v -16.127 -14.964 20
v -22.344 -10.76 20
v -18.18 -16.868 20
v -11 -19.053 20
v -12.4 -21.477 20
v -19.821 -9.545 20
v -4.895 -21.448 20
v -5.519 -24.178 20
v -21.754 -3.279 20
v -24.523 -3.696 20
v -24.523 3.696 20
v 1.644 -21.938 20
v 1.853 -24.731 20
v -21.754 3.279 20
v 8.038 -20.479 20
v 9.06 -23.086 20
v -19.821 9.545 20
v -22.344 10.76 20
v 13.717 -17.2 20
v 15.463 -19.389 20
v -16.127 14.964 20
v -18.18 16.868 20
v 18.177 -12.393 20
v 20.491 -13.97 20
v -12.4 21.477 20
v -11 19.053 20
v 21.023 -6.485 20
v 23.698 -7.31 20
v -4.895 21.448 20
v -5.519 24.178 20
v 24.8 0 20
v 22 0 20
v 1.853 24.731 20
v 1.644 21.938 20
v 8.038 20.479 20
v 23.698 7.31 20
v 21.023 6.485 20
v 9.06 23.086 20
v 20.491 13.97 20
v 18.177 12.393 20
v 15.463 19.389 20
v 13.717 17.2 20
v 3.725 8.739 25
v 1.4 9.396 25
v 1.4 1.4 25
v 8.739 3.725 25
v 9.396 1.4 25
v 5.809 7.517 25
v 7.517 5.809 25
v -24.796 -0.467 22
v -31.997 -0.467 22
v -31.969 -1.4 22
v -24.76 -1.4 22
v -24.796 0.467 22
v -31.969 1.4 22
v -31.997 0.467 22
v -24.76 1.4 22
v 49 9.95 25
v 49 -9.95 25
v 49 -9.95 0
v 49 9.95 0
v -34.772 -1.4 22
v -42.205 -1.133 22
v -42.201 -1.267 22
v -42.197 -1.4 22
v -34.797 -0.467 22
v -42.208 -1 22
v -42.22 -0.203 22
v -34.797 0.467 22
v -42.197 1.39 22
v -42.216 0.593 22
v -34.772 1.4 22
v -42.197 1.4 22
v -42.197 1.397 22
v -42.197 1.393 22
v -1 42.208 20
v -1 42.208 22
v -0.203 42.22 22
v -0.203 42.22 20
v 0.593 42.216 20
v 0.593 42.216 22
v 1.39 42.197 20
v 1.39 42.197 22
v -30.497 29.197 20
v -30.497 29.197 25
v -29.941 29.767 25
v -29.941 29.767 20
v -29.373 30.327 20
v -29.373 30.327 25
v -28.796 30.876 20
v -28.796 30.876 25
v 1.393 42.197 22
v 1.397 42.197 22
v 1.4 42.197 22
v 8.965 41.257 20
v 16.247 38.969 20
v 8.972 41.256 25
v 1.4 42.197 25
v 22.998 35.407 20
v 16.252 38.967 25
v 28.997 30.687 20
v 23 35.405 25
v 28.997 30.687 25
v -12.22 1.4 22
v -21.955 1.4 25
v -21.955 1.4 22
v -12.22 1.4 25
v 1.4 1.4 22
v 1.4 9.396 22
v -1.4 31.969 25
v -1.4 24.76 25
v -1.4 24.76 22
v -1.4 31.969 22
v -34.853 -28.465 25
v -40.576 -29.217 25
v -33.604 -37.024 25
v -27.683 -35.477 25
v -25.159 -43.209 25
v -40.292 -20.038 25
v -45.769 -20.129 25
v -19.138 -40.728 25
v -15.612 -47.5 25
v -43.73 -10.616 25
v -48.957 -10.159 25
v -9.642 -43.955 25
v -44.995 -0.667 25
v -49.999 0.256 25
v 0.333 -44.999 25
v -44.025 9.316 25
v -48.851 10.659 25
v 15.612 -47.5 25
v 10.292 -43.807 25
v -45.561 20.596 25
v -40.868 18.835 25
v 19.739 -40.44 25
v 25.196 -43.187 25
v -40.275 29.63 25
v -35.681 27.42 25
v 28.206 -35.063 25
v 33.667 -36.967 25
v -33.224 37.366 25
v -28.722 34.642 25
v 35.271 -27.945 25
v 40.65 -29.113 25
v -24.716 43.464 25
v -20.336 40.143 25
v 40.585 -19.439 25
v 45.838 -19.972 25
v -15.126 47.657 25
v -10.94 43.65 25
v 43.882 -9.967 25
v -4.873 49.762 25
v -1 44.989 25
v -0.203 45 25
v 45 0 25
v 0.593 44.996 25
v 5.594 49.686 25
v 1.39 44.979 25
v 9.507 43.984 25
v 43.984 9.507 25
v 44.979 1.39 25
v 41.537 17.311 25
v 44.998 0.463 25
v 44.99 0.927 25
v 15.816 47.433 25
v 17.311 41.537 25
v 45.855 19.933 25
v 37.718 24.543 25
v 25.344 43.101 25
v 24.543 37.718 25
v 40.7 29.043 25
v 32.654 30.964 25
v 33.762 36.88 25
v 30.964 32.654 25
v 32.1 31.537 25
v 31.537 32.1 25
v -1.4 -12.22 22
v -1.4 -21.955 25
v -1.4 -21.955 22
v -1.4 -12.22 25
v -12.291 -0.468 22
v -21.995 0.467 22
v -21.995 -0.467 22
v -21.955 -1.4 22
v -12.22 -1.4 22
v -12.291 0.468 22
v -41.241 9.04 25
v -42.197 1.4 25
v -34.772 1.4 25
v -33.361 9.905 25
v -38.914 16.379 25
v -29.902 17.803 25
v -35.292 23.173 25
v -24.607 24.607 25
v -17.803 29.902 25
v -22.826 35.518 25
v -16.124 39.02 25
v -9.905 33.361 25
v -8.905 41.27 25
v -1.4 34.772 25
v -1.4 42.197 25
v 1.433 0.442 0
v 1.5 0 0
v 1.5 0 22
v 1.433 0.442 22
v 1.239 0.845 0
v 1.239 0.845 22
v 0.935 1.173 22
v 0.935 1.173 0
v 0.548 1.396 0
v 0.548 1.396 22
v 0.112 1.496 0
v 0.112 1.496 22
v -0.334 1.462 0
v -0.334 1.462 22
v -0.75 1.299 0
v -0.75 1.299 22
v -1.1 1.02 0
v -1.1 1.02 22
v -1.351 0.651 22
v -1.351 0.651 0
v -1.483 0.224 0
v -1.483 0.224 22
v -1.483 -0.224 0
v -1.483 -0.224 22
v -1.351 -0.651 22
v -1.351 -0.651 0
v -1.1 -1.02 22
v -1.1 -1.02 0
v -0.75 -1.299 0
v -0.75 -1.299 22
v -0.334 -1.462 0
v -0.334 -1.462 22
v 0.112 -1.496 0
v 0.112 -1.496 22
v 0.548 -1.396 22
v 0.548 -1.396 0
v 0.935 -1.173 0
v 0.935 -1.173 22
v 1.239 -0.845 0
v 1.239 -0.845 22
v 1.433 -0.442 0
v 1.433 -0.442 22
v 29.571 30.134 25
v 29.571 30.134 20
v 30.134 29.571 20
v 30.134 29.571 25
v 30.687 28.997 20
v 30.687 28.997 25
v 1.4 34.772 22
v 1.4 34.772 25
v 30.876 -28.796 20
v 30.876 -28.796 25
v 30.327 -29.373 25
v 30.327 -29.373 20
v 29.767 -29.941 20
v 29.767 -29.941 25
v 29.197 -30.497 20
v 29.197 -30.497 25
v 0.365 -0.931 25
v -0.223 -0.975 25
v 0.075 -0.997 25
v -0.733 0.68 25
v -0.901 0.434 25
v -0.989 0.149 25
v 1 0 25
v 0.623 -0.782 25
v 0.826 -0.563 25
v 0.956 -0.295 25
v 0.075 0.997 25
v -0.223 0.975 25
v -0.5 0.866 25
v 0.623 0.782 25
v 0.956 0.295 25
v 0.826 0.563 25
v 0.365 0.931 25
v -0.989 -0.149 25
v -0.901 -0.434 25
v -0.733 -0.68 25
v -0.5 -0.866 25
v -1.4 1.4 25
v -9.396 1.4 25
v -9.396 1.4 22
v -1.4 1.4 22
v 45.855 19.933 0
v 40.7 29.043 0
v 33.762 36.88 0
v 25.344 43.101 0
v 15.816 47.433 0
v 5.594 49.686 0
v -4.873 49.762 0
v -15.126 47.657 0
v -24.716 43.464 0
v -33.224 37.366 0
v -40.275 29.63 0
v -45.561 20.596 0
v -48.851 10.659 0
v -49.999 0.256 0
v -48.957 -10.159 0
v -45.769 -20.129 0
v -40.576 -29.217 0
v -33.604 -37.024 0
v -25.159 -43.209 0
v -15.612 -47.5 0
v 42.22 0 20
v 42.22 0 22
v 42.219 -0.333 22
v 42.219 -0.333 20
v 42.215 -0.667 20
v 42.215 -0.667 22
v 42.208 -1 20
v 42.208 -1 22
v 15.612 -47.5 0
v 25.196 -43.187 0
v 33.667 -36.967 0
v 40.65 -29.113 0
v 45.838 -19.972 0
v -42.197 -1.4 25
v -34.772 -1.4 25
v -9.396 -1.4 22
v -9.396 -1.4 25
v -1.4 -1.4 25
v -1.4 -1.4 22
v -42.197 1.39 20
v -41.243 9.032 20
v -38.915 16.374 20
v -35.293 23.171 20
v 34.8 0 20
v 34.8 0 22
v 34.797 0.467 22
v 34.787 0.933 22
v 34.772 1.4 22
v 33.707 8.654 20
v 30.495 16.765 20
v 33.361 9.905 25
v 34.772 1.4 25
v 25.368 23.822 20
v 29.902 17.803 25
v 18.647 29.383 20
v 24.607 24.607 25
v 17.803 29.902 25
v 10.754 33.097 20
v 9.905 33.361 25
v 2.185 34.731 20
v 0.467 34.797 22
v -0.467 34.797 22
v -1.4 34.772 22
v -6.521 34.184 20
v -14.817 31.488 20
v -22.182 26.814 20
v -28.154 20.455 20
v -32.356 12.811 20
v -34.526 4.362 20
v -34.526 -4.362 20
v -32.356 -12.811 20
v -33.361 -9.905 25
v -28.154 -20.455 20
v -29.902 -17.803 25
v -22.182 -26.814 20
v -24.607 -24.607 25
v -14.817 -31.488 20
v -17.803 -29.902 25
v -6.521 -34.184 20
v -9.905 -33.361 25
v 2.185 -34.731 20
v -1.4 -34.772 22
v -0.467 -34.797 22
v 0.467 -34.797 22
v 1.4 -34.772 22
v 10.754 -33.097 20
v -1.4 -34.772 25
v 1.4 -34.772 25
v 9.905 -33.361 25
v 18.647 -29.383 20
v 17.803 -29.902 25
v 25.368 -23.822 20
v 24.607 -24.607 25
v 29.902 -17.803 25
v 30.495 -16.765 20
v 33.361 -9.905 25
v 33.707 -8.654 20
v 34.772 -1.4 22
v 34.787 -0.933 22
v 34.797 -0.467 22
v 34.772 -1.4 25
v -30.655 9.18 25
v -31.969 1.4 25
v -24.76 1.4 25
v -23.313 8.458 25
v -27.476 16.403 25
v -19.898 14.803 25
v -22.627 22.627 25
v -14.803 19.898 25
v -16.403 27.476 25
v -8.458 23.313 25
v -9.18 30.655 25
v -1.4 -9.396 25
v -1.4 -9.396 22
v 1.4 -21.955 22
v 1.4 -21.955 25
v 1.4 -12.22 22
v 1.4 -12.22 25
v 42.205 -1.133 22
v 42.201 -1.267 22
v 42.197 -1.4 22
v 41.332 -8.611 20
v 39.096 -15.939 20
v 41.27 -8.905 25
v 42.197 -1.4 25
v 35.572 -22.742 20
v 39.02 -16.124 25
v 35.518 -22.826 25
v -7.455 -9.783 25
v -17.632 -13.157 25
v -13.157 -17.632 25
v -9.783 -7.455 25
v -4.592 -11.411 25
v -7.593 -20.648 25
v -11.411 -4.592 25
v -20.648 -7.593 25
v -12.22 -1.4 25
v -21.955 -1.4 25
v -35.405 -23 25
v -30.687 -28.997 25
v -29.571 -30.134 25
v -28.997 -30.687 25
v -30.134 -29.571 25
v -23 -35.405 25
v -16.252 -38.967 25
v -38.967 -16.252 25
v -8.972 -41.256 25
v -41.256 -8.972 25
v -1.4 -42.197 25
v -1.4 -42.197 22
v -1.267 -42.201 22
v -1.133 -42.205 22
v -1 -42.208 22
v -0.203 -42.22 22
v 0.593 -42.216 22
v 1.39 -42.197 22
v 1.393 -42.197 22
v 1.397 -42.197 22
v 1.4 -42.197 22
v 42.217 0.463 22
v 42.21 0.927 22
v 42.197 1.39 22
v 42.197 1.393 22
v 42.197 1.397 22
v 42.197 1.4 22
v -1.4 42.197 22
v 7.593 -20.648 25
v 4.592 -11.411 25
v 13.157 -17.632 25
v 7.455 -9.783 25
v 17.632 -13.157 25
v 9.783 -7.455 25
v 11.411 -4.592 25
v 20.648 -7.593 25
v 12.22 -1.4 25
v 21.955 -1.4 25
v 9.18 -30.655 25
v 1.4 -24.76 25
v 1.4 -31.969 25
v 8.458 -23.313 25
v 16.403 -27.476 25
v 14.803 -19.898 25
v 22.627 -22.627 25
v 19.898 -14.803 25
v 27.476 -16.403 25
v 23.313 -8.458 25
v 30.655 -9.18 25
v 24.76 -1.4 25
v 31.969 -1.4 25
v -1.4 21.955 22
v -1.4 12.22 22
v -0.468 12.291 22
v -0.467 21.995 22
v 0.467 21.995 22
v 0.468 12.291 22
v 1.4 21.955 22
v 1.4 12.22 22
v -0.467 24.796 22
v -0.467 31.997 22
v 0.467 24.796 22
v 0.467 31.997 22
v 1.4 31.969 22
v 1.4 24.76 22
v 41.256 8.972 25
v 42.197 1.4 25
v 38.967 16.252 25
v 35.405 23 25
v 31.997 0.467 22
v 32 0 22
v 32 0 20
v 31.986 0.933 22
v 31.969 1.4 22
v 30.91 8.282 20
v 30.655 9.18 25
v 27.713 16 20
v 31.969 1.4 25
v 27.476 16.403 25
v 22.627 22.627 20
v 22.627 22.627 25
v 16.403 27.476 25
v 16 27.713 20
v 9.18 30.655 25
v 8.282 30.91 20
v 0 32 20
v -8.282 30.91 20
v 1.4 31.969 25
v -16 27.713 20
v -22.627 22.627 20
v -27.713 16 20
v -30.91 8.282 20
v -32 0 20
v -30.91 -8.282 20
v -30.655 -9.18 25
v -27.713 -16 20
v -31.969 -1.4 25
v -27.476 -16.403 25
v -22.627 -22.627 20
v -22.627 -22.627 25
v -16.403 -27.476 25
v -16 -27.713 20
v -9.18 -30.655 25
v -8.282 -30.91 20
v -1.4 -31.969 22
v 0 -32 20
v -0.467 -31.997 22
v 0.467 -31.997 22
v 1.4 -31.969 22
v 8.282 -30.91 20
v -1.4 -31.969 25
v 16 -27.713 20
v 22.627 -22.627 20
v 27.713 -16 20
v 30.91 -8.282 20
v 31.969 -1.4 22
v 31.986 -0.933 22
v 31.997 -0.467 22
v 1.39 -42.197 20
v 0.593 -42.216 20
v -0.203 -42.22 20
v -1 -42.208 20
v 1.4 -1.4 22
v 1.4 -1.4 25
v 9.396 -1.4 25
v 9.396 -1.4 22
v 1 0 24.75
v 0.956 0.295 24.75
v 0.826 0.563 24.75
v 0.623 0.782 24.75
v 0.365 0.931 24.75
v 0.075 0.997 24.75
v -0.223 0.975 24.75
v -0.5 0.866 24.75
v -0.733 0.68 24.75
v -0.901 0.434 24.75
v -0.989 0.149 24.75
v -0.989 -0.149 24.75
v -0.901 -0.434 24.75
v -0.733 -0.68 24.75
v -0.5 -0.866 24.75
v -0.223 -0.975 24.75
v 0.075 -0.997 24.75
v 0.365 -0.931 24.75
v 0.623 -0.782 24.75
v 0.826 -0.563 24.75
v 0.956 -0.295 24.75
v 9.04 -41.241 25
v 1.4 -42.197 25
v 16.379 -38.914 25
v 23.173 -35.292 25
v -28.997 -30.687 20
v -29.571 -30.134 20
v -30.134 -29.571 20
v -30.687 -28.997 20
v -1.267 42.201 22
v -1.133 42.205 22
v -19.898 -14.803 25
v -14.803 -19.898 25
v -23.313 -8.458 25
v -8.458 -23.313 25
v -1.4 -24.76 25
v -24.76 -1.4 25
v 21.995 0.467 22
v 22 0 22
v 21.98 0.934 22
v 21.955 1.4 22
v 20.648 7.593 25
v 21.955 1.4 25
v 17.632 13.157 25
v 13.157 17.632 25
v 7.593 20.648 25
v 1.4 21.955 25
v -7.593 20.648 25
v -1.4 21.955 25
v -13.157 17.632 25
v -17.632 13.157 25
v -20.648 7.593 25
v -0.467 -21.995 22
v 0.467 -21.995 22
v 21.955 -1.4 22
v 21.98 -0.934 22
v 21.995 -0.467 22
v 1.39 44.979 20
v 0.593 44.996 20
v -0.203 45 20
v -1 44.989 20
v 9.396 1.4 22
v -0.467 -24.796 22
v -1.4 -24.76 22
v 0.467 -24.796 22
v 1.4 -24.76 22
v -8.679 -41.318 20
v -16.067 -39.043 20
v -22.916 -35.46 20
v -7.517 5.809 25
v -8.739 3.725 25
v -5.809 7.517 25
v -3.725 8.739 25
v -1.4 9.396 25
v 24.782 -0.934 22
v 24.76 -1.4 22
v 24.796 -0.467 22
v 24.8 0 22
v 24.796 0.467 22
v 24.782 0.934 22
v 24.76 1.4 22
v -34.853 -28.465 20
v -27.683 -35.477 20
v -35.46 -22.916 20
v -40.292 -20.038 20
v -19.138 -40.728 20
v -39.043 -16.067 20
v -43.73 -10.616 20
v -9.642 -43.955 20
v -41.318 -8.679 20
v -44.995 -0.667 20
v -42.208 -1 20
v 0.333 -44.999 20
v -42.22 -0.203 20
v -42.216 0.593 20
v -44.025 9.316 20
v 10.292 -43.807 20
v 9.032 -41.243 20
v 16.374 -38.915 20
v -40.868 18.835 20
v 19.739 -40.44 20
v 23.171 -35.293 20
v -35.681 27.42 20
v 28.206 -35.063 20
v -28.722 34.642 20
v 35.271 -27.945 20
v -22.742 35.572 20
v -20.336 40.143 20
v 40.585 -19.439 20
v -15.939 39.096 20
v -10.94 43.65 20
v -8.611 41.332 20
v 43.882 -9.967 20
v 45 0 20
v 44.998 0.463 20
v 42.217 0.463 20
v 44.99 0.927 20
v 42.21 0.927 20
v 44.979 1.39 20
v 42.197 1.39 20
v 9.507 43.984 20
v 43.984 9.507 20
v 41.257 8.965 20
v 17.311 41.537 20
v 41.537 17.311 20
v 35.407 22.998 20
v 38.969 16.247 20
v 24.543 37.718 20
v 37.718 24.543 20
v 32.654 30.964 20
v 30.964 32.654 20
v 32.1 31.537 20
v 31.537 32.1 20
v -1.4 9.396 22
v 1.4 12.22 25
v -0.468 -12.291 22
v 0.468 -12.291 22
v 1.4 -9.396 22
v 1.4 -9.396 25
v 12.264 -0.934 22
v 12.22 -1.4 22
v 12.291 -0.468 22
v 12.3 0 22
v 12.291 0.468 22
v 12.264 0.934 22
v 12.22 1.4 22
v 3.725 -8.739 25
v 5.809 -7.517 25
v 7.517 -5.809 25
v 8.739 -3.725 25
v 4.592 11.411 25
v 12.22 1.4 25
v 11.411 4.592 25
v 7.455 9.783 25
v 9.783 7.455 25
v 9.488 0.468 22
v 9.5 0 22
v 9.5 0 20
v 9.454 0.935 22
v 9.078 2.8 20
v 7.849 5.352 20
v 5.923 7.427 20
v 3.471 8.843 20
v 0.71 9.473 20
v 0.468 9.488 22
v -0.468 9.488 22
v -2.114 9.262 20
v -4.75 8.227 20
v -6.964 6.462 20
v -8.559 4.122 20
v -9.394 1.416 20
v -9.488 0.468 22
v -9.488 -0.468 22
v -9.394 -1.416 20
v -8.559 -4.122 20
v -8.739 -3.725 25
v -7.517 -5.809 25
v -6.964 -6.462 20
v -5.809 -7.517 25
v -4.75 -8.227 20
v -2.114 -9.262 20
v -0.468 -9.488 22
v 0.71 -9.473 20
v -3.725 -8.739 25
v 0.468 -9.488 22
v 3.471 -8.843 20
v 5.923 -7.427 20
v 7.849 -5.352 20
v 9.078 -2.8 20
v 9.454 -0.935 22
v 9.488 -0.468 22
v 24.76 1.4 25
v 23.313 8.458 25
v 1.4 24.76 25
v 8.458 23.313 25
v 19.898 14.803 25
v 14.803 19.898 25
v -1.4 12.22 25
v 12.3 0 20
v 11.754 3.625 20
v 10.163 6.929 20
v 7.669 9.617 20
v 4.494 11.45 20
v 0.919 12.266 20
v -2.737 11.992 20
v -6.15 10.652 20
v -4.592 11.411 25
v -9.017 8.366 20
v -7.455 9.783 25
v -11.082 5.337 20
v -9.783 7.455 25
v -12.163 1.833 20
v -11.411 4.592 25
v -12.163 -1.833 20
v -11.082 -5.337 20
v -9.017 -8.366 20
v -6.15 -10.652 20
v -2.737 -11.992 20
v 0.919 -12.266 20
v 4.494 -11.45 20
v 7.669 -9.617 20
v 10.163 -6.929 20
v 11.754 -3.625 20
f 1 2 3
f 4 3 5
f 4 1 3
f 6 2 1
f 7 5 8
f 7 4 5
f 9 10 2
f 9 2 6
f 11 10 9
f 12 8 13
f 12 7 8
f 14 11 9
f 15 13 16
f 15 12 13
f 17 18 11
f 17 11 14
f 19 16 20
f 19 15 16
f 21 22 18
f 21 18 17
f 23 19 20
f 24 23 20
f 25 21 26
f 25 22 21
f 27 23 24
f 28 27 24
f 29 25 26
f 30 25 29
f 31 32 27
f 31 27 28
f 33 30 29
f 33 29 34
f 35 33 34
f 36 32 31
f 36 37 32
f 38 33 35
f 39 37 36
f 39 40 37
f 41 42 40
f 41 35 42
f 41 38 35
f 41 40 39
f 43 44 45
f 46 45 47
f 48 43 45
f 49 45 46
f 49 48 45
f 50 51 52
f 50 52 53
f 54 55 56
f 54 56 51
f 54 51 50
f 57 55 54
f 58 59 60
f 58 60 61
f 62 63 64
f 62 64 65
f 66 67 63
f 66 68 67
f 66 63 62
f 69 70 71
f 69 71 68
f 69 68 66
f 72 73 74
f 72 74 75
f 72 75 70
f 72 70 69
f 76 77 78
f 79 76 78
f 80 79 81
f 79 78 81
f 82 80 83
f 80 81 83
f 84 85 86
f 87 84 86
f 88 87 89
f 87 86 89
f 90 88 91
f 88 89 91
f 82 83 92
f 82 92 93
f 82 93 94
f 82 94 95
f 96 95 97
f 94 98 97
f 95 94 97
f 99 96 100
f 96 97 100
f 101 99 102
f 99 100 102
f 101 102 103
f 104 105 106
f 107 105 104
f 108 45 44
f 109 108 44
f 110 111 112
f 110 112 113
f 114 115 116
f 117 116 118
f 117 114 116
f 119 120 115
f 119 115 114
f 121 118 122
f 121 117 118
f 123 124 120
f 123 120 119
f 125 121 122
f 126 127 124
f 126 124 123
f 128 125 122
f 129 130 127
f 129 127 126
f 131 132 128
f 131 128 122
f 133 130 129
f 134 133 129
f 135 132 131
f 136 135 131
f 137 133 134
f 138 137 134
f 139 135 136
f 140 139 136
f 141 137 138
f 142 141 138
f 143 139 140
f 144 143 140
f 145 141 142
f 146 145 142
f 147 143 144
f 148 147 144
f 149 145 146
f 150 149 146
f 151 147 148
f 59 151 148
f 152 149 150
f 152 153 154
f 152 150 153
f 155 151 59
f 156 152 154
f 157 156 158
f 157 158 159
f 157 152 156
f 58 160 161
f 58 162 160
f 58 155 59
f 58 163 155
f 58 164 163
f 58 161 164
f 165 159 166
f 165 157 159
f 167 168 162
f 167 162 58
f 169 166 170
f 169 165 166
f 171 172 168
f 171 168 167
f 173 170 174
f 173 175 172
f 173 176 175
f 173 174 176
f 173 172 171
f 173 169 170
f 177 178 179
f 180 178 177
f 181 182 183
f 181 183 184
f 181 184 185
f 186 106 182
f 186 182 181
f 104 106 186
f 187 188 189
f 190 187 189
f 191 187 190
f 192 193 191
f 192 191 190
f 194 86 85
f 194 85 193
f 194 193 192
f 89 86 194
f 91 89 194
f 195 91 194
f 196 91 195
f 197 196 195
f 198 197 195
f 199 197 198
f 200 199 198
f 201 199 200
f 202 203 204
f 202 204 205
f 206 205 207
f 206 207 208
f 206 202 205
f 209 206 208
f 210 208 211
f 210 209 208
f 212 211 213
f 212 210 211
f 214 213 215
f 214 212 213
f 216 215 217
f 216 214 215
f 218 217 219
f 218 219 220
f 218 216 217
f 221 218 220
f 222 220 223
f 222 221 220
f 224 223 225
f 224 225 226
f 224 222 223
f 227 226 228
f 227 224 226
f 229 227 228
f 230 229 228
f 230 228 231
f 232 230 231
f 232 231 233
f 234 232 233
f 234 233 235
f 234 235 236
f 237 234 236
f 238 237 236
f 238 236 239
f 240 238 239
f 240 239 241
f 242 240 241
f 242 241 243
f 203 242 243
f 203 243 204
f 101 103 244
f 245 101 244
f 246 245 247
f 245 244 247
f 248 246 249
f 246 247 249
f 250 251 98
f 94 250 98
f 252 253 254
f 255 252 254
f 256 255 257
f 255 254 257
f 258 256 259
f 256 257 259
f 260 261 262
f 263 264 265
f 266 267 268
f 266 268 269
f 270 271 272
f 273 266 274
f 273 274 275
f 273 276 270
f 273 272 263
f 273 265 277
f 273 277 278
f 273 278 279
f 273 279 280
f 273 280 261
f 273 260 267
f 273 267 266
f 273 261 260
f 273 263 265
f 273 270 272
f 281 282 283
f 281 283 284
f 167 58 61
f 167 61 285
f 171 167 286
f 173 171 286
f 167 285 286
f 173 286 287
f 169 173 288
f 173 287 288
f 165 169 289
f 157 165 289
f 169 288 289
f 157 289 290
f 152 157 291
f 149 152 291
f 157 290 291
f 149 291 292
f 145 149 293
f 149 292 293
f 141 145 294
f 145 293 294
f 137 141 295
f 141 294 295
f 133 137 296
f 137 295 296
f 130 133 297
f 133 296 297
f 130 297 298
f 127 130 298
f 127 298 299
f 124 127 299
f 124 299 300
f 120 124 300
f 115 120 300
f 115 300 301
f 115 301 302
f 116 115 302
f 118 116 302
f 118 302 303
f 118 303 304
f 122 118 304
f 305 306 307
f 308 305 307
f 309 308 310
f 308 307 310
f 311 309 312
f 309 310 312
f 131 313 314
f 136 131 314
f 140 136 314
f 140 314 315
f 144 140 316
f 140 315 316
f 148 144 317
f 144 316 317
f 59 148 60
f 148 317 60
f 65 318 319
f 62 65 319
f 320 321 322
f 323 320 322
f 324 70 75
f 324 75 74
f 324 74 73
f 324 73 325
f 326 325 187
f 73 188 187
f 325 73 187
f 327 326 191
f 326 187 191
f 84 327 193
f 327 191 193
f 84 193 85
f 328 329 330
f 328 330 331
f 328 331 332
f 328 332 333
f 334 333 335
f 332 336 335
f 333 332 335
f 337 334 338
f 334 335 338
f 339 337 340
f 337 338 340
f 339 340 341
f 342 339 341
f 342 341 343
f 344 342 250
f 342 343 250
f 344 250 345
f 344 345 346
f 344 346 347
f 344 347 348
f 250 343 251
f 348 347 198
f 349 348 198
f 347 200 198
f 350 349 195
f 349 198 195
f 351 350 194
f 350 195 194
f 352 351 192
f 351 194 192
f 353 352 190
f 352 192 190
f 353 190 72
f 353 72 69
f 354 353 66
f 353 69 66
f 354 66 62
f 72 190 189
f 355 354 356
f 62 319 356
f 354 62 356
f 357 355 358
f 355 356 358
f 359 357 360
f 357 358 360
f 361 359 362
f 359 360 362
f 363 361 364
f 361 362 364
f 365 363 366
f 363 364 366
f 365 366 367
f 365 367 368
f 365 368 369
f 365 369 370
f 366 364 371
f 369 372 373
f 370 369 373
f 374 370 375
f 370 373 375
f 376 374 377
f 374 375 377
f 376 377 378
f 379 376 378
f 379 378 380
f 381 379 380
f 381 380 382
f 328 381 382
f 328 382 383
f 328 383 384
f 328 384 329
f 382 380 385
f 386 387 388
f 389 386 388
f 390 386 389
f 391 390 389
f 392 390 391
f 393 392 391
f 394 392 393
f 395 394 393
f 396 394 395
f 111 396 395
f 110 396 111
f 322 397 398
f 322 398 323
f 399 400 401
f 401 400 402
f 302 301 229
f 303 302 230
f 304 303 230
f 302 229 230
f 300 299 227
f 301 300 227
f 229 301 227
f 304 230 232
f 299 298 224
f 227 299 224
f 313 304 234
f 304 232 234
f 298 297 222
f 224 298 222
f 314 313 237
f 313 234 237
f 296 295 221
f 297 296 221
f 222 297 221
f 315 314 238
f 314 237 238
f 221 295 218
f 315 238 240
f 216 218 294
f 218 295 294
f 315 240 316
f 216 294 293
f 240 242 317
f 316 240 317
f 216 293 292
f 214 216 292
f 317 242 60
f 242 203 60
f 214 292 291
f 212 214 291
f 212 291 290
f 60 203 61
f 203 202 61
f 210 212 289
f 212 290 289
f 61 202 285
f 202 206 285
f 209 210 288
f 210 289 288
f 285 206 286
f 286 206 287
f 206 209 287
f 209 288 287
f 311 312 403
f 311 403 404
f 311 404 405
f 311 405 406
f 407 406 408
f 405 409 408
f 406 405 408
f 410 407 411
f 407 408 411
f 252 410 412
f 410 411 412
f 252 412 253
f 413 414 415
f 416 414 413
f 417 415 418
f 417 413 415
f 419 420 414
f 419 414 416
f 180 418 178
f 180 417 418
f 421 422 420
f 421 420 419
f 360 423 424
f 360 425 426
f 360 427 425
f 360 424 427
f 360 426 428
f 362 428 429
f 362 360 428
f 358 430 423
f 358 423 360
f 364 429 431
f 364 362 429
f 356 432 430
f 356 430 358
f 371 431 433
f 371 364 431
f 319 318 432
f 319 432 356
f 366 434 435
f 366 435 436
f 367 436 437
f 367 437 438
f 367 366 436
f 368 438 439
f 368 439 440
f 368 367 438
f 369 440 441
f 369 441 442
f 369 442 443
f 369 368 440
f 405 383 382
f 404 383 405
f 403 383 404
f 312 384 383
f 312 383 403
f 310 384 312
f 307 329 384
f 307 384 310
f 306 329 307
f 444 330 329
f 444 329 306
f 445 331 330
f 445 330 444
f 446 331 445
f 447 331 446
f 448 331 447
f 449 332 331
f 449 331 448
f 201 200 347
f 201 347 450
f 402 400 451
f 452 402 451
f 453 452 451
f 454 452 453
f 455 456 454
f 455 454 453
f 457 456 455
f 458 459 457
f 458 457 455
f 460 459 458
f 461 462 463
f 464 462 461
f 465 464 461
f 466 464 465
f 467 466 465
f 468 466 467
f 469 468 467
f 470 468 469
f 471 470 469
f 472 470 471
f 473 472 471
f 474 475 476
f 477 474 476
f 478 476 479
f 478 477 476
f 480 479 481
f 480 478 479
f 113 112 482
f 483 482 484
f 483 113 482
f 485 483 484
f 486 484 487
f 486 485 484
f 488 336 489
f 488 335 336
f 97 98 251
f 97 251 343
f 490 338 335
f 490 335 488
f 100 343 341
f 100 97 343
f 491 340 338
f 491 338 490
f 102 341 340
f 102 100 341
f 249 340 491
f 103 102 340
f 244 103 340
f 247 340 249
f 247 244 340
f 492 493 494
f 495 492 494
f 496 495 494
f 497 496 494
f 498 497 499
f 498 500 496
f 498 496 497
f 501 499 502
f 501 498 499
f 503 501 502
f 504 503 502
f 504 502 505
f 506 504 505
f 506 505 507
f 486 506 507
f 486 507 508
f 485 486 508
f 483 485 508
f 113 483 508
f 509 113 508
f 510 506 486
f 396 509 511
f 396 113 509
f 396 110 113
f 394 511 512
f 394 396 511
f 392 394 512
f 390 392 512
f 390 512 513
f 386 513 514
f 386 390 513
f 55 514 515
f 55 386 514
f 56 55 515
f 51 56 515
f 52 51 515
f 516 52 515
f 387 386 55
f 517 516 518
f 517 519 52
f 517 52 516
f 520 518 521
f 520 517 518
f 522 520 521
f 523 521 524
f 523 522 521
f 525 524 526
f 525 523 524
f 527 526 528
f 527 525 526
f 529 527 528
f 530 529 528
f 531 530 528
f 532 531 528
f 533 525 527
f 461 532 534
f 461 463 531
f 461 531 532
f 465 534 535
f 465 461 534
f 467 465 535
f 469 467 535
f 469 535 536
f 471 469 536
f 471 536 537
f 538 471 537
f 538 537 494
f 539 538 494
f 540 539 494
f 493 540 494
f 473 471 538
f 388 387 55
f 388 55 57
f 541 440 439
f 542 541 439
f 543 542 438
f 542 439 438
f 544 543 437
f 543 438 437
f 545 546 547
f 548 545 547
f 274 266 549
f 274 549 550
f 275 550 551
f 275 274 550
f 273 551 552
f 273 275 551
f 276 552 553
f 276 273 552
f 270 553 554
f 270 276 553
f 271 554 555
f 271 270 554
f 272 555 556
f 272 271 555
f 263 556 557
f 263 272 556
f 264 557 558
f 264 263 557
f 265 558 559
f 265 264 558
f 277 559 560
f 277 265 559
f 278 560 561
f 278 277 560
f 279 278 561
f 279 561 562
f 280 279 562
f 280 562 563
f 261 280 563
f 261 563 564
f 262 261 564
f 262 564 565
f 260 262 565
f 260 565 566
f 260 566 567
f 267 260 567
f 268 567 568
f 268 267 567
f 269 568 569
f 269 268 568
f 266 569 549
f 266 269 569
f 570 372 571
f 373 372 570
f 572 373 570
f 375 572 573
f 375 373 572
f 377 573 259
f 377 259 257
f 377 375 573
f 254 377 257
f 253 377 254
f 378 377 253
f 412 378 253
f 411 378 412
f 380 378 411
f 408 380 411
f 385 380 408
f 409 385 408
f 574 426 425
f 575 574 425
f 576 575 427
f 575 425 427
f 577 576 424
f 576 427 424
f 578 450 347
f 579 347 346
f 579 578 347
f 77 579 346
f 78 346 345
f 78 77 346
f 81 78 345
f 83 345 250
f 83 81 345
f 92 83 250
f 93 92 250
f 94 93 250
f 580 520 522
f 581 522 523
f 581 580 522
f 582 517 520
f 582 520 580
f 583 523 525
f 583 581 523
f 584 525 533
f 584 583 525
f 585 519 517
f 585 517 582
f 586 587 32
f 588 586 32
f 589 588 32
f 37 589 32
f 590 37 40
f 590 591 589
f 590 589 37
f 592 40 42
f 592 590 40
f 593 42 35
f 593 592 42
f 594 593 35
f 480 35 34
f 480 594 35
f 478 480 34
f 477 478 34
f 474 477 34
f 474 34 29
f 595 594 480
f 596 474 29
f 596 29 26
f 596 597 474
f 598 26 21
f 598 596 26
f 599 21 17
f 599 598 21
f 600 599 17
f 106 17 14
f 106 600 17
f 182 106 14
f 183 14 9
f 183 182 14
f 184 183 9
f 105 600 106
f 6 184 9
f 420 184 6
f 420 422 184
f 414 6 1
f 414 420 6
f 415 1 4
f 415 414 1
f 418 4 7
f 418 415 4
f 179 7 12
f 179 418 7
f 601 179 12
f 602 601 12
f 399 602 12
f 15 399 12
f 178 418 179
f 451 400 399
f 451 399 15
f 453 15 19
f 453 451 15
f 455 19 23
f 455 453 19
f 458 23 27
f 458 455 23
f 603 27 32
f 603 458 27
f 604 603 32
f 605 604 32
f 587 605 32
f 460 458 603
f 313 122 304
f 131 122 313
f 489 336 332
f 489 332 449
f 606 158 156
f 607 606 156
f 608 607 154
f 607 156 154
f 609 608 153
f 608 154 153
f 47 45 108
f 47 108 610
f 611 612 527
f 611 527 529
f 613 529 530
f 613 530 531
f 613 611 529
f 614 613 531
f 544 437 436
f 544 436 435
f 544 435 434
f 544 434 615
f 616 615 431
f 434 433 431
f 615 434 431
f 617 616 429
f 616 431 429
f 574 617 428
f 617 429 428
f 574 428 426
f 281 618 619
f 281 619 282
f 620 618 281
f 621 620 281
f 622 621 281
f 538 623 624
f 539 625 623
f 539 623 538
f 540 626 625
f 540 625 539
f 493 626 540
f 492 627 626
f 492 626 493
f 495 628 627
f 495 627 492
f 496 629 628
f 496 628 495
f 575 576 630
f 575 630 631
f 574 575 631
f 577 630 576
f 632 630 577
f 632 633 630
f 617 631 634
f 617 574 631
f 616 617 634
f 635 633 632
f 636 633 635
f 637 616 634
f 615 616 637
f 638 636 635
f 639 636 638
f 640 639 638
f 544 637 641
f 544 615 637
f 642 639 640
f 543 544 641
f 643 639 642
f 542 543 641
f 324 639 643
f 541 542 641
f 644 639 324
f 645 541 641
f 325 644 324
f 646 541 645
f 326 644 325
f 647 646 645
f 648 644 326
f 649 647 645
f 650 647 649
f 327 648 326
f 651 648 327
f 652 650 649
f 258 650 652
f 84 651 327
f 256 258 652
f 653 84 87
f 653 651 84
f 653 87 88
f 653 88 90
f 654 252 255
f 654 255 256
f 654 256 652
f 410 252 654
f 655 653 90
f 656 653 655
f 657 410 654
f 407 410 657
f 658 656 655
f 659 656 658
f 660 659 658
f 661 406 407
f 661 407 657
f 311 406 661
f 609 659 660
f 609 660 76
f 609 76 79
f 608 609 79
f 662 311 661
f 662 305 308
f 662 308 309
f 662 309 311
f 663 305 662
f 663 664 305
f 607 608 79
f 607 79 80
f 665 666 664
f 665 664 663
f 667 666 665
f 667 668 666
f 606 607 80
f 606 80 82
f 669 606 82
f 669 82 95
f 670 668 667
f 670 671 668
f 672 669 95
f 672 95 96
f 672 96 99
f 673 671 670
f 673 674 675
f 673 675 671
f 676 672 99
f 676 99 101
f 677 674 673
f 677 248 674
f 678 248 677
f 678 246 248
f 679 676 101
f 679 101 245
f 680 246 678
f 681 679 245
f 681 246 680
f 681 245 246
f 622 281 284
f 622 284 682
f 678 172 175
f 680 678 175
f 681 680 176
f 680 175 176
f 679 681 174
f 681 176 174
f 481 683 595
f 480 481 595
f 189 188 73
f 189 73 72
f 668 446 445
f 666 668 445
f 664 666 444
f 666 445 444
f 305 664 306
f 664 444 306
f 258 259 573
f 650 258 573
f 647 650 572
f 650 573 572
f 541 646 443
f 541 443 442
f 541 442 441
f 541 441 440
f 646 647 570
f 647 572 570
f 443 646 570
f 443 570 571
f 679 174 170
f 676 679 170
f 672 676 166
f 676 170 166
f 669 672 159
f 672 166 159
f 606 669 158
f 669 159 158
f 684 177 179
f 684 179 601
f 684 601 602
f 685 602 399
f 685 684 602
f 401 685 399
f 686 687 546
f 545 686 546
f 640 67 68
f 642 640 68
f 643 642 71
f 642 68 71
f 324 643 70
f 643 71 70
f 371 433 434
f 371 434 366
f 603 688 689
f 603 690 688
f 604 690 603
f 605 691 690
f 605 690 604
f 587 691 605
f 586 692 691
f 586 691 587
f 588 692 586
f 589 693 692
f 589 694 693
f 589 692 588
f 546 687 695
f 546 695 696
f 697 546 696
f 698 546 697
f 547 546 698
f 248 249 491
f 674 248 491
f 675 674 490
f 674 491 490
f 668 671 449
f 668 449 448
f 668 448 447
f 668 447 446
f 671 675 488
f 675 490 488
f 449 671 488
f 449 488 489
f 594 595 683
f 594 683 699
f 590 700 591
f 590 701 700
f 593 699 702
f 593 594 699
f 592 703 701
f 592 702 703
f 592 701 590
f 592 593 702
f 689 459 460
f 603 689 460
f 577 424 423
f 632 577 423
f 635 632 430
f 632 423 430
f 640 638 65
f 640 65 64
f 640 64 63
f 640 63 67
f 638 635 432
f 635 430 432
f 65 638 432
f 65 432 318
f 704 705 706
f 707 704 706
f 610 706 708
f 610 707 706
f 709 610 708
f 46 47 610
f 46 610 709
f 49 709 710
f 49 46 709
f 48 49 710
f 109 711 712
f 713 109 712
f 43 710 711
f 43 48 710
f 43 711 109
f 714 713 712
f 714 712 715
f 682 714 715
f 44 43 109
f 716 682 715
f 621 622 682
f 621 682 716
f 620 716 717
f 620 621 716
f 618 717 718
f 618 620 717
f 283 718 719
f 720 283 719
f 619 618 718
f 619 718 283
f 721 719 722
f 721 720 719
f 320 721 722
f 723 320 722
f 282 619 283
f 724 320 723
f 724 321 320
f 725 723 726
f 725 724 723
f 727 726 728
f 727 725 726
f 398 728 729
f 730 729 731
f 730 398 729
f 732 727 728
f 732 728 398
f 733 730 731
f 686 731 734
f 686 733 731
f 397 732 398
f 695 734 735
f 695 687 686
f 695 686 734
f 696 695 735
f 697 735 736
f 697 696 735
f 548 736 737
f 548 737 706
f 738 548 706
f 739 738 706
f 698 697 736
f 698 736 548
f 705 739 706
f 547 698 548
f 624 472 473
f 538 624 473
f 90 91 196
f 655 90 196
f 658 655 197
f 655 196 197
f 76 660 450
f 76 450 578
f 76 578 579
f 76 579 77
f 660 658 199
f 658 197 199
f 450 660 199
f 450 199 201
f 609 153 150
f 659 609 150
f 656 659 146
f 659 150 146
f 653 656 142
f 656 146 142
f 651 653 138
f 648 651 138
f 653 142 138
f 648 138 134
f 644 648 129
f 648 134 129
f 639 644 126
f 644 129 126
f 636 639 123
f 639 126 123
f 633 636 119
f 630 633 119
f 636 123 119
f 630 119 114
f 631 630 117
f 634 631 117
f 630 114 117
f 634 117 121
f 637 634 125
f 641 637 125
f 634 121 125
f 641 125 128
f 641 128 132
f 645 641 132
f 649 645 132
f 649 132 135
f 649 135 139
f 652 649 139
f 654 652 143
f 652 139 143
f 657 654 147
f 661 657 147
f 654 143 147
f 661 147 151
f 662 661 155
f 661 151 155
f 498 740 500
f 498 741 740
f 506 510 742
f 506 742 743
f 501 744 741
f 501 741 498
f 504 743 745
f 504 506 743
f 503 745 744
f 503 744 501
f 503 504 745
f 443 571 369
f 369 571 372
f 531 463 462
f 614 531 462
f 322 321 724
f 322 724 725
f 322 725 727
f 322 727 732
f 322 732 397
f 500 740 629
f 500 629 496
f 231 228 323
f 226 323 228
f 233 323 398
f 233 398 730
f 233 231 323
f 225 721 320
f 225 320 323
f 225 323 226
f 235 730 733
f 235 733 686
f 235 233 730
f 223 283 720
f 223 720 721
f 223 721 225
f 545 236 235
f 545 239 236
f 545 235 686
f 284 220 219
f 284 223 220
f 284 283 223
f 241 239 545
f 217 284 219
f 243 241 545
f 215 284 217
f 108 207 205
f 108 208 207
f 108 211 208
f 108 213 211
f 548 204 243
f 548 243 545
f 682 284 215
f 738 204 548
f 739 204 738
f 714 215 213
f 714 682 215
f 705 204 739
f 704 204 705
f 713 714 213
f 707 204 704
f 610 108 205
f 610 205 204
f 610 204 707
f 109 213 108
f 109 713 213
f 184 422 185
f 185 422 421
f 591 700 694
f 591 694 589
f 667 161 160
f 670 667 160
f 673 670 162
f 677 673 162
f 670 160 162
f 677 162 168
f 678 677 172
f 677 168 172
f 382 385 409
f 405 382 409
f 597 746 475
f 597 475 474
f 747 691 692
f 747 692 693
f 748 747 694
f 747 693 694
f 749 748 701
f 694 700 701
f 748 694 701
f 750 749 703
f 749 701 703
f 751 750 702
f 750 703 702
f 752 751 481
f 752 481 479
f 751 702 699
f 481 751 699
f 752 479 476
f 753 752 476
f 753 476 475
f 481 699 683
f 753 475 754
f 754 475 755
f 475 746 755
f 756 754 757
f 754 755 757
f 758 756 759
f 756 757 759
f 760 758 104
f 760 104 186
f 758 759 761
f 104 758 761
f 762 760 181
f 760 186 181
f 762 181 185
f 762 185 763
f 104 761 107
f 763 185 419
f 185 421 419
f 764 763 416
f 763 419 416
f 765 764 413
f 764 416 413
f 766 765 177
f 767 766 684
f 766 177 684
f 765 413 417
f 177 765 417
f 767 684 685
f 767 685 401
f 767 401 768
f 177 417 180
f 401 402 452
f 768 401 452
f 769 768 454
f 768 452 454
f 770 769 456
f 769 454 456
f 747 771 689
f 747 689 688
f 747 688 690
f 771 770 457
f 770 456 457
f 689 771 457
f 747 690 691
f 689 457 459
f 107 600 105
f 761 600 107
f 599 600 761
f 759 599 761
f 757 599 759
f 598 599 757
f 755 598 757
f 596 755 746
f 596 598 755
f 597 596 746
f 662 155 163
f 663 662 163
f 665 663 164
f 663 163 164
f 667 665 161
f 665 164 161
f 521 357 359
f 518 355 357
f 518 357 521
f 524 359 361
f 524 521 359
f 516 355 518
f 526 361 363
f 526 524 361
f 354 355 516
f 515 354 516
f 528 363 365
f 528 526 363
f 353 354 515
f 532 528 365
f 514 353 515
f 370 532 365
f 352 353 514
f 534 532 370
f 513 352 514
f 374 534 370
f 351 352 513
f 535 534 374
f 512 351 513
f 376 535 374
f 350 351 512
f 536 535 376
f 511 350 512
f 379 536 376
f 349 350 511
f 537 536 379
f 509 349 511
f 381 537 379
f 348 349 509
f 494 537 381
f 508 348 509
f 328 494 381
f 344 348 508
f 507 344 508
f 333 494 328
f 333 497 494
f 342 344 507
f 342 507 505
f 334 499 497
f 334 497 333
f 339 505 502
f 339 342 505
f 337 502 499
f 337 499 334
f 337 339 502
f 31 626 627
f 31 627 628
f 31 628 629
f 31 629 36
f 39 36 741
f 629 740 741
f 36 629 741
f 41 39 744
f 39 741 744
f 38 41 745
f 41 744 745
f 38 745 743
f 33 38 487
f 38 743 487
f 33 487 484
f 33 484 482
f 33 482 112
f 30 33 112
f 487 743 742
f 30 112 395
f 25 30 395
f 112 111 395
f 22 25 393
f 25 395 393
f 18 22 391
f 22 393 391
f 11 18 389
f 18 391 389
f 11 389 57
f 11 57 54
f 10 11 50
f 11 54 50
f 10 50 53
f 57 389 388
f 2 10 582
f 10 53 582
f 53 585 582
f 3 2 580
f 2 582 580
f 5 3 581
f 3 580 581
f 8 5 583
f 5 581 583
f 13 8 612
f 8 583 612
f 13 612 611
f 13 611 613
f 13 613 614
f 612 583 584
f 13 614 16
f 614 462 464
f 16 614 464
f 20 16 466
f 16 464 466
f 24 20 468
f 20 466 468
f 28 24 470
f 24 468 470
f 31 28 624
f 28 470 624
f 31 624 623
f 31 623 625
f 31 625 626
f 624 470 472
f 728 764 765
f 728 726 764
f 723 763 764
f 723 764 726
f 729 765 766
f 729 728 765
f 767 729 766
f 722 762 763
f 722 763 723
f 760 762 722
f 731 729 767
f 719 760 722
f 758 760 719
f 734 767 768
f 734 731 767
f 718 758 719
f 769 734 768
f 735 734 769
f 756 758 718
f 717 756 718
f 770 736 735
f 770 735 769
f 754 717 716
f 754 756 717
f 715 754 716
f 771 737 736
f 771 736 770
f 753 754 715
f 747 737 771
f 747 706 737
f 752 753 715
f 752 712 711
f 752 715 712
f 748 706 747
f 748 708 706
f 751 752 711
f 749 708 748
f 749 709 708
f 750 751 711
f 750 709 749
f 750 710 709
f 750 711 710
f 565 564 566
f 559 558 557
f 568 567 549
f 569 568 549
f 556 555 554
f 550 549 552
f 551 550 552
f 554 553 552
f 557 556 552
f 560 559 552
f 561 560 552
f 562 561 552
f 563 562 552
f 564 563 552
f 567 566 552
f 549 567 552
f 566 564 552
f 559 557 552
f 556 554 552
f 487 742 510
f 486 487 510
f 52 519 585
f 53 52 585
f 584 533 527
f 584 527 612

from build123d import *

# Parameters (mm, degrees)
F0_R      = 50
F0_R_2    = 1.5
F1_DEPTH  = 25
F3_DEPTH  = 5
F4_R      = 12.3
F4_R_2    = 9.5
F5_DEPTH  = 5
F6_R      = 24.8
F6_R_2    = 22
F7_DEPTH  = 5
F8_R      = 34.8
F8_R_2    = 32
F9_DEPTH  = 5
F10_W     = 2.8
F10_H     = 88
F11_W     = 88
F11_H     = 2.8
F12_DEPTH = 3
F13_W     = 36
F13_H     = 5
F13_W_2   = 2
F13_H_2   = 29
F14_DEPTH = 25
F15_R     = 1
F16_DEPTH = 0.25


with BuildPart() as f1:
    # F0 (on Top) → F1 (new body)
    with BuildSketch(Plane.XY):
        Circle(F0_R)
        Circle(F0_R_2, mode=Mode.SUBTRACT)
    extrude(amount=F1_DEPTH)

    # F2 (on face) → F3 (cut)
    with BuildSketch(Plane.XY.offset(25)):
        with BuildLine():
            Line((1.39, 42.197112), (1.39, 44.978527))
            ThreePointArc((1.39, 44.978527), (0.195069, 44.999577), (-1, 44.988888))
            Line((-1, 44.988888), (-1, 42.208156))
            ThreePointArc((-1, 42.208156), (0.195078, 42.219549), (1.39, 42.197112))
        make_face()
        with BuildLine():
            ThreePointArc((30.963591, 32.653576), (17.310829, 41.537154), (1.39, 44.978527))
            Line((1.39, 44.978527), (1.39, 42.197112))
            ThreePointArc((1.39, 42.197112), (16.246972, 38.968761), (28.997095, 30.68708))
            Line((28.997095, 30.68708), (30.963591, 32.653576))
        make_face()
        with BuildLine():
            Line((-1, 42.208156), (-1, 44.988888))
            ThreePointArc((-1, 44.988888), (-31.464265, -32.171416), (45, 0))
            ThreePointArc((45, 0), (44.994631, 0.695083), (44.978527, 1.39))
            Line((44.978527, 1.39), (42.197112, 1.39))
            ThreePointArc((42.197112, 1.39), (42.214278, 0.695094), (42.22, 0))
            ThreePointArc((42.22, 0), (42.217039, -0.500035), (42.208156, -1))
            ThreePointArc((42.208156, -1), (39.095704, -15.939082), (30.875921, -28.795936))
            ThreePointArc((30.875921, -28.795936), (30.048489, -29.658333), (29.196979, -30.496964))
            ThreePointArc((29.196979, -30.496964), (16.374193, -38.915475), (1.39, -42.197112))
            ThreePointArc((1.39, -42.197112), (0.195078, -42.219549), (-1, -42.208156))
            ThreePointArc((-1, -42.208156), (-16.066743, -39.043414), (-28.997095, -30.68708))
            ThreePointArc((-28.997095, -30.68708), (-29.854048, -29.854048), (-30.68708, -28.997095))
            ThreePointArc((-30.68708, -28.997095), (-39.043414, -16.066743), (-42.208156, -1))
            ThreePointArc((-42.208156, -1), (-42.219549, 0.195078), (-42.197112, 1.39))
            ThreePointArc((-42.197112, 1.39), (-38.915475, 16.374193), (-30.496964, 29.196979))
            ThreePointArc((-30.496964, 29.196979), (-29.658333, 30.048489), (-28.795936, 30.875921))
            ThreePointArc((-28.795936, 30.875921), (-15.939082, 39.095704), (-1, 42.208156))
        make_face()
        with BuildLine():
            ThreePointArc((32.653576, 30.963591), (31.819805, 31.819805), (30.963591, 32.653576))
            Line((30.963591, 32.653576), (28.997095, 30.68708))
            ThreePointArc((28.997095, 30.68708), (29.854048, 29.854048), (30.68708, 28.997095))
            Line((30.68708, 28.997095), (32.653576, 30.963591))
        make_face()
        with BuildLine():
            ThreePointArc((44.978527, 1.39), (41.537154, 17.310829), (32.653576, 30.963591))
            Line((32.653576, 30.963591), (30.68708, 28.997095))
            ThreePointArc((30.68708, 28.997095), (38.968761, 16.246972), (42.197112, 1.39))
            Line((42.197112, 1.39), (44.978527, 1.39))
        make_face()
    extrude(amount=-F3_DEPTH, mode=Mode.SUBTRACT)

    # F4 (on face) → F5 (cut)
    with BuildSketch(Plane.XY.offset(25)):
        Circle(F4_R)
        Circle(F4_R_2, mode=Mode.SUBTRACT)
    extrude(amount=-F5_DEPTH, mode=Mode.SUBTRACT)

    # F6 (on face) → F7 (cut)
    with BuildSketch(Plane.XY.offset(25)):
        Circle(F6_R)
        Circle(F6_R_2, mode=Mode.SUBTRACT)
    extrude(amount=-F7_DEPTH, mode=Mode.SUBTRACT)

    # F8 (on face) → F9 (cut)
    with BuildSketch(Plane.XY.offset(25)):
        Circle(F8_R)
        Circle(F8_R_2, mode=Mode.SUBTRACT)
    extrude(amount=-F9_DEPTH, mode=Mode.SUBTRACT)

    # F10 (on face) + F11 (on face) → F12 (cut)
    with BuildSketch(Plane.XY.offset(25)):
        Rectangle(F10_W, F10_H)
    with BuildSketch(Plane.XY.offset(25)):
        Rectangle(F11_W, F11_H)
    extrude(amount=-F12_DEPTH, mode=Mode.SUBTRACT)

    # F13 (on face) → F14 (cut)
    with BuildSketch(Plane.XY.offset(25)):
        with Locations((0, -50)):
            Rectangle(F13_W, F13_H)
        with Locations((50, 0)):
            Rectangle(F13_W_2, F13_H_2)
    extrude(amount=-F14_DEPTH, mode=Mode.SUBTRACT)


with BuildPart() as f16:
    # F15 (on face) → F16 (new body)
    with BuildSketch(Plane.XY.offset(25)):
        Circle(F15_R)
    extrude(amount=-F16_DEPTH)


solid = Compound([f1.part, f16.part])
